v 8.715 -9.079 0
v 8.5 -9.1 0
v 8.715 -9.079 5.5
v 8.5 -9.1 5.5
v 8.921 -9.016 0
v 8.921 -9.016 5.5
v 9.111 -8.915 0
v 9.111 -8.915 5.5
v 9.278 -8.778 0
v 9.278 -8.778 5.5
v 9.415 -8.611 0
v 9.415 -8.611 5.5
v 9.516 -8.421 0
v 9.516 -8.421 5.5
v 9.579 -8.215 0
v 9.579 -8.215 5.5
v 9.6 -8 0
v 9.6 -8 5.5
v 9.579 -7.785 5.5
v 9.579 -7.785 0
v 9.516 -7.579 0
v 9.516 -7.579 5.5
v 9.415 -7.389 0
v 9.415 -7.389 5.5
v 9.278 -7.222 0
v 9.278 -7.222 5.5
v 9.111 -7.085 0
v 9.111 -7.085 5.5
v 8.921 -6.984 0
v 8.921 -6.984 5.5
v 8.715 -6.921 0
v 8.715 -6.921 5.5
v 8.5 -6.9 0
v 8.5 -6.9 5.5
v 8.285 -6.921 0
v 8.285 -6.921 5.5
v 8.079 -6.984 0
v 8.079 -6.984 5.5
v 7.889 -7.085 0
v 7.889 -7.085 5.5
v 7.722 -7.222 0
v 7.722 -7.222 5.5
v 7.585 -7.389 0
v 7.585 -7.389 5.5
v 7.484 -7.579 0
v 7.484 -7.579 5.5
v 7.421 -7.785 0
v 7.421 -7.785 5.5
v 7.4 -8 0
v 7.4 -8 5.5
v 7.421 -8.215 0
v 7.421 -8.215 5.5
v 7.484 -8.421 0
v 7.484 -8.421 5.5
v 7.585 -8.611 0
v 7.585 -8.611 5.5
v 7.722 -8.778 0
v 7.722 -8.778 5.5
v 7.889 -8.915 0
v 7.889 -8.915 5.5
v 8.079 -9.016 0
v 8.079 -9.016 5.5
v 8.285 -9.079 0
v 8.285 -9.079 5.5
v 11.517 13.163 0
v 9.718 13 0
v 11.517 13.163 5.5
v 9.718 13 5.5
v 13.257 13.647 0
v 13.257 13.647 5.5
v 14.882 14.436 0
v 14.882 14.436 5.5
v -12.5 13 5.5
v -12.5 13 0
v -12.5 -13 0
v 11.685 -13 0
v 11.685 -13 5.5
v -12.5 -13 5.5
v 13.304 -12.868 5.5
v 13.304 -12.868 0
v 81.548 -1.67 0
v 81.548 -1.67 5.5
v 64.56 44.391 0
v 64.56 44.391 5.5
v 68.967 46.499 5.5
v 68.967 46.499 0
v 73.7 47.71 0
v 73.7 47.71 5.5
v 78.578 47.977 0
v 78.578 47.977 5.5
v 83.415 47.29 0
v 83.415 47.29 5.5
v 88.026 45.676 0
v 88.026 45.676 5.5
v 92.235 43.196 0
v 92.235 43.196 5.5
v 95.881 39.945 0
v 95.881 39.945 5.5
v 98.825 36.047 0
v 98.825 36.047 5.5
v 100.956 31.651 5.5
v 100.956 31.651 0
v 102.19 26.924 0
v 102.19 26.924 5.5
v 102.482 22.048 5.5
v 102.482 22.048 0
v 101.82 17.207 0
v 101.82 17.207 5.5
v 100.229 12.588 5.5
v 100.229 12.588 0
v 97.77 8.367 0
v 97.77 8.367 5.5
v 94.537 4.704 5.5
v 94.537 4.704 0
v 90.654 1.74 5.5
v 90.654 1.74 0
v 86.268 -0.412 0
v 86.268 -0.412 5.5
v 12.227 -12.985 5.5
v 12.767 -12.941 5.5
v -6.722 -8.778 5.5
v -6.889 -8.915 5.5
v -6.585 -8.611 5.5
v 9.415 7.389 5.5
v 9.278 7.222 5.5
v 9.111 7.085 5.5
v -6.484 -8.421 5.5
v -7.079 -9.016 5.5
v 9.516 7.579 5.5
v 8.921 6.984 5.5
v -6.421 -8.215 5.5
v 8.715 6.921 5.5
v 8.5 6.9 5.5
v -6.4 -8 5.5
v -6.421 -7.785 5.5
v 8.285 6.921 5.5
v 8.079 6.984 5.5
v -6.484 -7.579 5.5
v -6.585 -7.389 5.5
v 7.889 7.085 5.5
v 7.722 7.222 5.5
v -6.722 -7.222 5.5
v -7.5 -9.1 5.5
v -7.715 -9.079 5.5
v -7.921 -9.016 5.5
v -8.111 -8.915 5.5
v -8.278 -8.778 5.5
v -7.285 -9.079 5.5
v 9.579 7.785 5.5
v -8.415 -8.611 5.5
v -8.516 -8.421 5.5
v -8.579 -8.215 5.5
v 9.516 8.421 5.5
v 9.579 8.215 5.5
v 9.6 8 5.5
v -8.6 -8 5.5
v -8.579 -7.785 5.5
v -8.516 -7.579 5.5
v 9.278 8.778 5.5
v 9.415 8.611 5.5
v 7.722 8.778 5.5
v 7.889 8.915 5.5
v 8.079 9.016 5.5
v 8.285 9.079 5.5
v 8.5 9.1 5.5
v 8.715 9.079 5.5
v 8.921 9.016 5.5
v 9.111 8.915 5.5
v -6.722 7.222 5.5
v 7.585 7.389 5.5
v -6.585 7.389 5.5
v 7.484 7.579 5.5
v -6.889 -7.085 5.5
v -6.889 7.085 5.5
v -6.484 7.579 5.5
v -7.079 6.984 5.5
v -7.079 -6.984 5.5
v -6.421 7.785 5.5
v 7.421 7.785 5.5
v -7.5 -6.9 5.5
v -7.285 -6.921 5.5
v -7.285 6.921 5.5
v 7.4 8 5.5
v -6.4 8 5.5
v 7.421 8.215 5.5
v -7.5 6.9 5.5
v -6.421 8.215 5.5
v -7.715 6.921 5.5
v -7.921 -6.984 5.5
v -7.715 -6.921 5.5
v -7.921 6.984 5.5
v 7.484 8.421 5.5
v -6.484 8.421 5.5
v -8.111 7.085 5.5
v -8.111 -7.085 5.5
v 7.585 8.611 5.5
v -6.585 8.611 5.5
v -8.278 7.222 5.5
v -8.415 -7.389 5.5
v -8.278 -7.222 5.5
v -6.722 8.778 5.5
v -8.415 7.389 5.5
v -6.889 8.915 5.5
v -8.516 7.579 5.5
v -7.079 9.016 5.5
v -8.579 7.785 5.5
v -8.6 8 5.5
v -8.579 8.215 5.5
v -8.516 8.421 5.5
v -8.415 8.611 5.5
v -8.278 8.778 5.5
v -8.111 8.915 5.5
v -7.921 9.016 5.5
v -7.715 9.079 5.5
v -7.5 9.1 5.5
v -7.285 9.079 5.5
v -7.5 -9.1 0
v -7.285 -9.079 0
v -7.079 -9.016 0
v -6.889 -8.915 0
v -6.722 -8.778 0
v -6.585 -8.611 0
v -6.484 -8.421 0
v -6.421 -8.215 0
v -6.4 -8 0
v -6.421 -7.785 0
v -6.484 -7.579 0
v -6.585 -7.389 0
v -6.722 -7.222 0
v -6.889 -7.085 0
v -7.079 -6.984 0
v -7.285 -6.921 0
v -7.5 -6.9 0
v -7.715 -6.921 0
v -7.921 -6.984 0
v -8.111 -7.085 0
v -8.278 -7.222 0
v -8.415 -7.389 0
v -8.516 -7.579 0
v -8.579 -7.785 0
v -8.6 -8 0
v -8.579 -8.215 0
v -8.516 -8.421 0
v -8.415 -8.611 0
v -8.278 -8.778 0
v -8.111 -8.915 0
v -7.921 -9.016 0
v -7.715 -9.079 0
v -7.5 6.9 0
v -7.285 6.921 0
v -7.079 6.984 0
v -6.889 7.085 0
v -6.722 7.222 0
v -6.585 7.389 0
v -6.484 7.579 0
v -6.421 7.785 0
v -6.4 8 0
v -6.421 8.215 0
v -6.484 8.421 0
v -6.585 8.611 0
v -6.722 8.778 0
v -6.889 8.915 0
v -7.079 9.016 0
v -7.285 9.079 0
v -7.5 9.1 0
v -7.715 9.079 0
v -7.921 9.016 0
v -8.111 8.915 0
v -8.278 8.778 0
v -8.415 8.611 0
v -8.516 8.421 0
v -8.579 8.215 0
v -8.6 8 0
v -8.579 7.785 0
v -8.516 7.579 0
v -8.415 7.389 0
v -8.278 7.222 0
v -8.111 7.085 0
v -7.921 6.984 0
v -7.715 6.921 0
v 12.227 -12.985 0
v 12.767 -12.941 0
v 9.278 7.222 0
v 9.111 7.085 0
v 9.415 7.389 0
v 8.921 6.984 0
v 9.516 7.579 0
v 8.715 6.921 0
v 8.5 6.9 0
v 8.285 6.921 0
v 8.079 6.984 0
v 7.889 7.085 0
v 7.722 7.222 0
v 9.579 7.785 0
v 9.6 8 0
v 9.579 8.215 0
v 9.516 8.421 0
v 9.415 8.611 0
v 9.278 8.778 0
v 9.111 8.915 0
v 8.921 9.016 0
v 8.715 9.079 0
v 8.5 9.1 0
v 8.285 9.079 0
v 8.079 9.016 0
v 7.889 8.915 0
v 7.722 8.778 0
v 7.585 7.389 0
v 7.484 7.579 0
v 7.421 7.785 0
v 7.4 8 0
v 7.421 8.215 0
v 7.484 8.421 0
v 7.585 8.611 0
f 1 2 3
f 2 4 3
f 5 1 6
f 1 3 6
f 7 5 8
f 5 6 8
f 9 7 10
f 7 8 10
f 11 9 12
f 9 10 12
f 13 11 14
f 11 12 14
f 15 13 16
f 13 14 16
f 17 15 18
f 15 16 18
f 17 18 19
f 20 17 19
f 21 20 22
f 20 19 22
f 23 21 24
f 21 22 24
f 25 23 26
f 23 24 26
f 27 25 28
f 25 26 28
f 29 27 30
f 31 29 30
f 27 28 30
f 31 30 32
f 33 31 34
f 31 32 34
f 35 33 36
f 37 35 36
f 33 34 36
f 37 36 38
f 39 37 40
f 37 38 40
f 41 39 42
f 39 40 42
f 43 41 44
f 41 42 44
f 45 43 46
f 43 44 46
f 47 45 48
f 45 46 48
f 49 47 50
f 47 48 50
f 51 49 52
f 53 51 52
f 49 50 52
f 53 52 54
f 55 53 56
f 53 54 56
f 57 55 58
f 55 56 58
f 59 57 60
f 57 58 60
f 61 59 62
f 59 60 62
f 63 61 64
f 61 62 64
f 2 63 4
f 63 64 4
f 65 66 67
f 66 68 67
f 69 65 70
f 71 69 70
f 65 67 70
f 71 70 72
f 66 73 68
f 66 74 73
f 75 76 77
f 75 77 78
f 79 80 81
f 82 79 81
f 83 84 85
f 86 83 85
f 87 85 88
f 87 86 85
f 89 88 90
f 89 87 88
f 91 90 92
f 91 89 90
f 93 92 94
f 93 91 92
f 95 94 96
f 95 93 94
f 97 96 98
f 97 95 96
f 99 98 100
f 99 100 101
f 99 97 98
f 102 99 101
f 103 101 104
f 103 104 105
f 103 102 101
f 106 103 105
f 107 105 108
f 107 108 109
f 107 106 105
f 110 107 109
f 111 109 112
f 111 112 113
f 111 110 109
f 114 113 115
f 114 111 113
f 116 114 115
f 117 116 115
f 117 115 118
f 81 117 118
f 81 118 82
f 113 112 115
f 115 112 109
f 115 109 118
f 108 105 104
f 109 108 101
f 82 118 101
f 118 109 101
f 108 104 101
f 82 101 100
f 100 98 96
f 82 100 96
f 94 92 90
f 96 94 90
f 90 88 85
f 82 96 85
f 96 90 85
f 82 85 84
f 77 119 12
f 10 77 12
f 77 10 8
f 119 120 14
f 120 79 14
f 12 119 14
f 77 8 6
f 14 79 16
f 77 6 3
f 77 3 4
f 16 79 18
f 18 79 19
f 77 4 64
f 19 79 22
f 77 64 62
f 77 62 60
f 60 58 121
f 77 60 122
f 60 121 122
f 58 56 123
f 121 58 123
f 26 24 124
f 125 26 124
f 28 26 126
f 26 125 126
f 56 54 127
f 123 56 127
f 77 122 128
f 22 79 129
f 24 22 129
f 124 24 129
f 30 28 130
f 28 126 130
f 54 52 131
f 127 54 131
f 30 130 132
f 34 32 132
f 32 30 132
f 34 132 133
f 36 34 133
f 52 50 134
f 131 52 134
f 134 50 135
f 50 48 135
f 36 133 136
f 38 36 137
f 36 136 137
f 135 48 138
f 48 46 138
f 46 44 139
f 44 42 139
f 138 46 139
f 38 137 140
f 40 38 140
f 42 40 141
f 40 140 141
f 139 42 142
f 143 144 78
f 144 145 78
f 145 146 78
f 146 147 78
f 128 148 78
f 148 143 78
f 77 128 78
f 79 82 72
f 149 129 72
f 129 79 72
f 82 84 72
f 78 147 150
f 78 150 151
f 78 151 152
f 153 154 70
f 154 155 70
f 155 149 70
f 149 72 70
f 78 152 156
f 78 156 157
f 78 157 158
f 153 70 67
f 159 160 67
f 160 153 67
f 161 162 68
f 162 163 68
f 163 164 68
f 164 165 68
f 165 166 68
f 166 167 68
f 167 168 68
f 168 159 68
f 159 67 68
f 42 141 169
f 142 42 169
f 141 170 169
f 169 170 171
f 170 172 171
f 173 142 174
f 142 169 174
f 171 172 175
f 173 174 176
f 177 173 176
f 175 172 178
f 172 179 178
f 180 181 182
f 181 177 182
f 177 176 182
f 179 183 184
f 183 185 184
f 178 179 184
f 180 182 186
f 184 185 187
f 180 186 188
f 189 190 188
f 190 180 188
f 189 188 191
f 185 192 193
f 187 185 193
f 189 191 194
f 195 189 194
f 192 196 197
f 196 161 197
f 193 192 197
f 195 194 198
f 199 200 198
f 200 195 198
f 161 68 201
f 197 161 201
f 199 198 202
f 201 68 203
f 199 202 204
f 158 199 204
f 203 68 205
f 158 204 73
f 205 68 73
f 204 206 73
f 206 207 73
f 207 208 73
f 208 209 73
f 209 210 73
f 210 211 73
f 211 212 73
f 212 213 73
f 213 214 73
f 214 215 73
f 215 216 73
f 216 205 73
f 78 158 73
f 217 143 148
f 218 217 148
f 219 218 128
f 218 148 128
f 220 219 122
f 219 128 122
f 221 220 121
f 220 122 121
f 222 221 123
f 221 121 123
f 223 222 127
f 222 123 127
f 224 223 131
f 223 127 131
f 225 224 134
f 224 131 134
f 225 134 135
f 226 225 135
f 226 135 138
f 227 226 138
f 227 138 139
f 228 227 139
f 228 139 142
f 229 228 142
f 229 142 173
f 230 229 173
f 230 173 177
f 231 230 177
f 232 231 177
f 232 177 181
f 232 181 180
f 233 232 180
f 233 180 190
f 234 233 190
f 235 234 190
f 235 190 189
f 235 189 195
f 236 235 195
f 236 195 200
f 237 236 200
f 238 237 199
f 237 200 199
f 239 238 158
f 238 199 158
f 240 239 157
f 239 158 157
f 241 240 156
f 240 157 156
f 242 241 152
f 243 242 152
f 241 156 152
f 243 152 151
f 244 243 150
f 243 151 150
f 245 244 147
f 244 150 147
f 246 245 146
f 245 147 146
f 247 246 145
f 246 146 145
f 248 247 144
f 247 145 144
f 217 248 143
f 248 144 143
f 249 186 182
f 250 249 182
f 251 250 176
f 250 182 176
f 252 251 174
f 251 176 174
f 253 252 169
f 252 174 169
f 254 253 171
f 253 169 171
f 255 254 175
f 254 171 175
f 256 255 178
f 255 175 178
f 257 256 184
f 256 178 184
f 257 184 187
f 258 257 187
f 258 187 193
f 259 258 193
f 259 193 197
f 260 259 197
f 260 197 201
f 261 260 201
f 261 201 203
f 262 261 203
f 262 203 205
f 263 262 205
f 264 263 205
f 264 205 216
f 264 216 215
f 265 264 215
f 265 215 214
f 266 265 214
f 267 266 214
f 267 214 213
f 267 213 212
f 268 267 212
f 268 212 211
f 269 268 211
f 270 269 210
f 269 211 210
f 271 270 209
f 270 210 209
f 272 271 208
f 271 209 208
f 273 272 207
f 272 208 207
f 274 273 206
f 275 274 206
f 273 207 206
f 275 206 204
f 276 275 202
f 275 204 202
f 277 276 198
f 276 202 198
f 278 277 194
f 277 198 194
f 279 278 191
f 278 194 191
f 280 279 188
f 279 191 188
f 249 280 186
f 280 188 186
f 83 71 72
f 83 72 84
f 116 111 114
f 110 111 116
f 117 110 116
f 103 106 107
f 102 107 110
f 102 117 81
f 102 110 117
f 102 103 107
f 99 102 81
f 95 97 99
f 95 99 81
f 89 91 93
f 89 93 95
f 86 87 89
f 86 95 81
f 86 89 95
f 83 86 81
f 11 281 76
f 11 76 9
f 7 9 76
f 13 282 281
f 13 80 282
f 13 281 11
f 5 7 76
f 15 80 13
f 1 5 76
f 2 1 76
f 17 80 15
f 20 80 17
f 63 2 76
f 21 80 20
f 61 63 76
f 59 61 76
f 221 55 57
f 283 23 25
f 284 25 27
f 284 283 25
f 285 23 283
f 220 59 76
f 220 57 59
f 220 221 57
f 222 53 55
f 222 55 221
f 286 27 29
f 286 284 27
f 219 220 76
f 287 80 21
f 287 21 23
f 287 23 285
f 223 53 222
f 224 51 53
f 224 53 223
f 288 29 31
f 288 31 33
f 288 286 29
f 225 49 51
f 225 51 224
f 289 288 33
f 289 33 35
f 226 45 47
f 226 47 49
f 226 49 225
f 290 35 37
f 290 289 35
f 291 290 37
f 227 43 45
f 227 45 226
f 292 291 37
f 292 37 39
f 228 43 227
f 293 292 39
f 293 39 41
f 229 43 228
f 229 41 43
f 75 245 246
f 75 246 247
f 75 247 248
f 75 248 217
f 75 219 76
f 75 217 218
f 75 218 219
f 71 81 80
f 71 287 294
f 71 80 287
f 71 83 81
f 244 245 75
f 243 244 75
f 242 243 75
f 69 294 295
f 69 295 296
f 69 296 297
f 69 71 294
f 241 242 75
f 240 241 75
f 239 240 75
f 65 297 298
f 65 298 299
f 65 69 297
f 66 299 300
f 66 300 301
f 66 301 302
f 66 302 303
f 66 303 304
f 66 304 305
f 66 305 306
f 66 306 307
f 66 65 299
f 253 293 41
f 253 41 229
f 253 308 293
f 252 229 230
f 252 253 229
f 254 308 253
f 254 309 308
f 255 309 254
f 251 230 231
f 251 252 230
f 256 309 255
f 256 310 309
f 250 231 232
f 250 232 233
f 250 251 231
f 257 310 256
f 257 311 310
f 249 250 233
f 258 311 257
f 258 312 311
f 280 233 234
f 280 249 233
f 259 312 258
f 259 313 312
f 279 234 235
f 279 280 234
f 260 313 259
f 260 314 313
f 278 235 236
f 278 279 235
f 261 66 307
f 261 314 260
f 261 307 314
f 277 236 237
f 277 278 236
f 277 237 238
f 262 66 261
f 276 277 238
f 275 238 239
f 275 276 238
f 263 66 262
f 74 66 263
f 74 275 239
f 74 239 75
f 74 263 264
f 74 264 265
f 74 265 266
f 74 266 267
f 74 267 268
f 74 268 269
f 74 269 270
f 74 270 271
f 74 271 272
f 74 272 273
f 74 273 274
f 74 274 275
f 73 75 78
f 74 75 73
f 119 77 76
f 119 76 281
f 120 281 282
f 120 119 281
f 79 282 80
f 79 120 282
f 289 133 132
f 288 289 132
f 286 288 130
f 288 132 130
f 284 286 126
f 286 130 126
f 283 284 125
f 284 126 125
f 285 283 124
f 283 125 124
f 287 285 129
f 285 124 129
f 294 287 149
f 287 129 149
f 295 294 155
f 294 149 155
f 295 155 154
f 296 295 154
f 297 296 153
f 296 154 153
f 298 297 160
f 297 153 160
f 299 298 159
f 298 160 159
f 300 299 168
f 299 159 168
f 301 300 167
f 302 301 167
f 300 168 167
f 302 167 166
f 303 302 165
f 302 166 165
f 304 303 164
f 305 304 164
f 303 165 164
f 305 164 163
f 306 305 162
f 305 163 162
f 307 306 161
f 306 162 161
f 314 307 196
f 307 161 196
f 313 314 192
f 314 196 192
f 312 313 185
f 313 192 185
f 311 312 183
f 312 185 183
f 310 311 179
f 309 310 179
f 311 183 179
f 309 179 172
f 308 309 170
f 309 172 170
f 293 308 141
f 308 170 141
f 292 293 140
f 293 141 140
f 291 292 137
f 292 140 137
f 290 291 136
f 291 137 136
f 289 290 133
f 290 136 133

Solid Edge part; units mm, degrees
sketch "Sketch1" plane through (0, 0, 0) normal (0, 0, 1) x (1, 0, 0)
  line L0 (12.5, -13) -> (-12.5, -13)
  line L1 (-12.5, -13) -> (-12.5, 13)
  line L2 (-12.5, 13) -> (12.5, 13)
  line L3 (12.5, 13) -> (12.5, -13)
  dimension "D1" = 26
  dimension "D2" = 25
extrude "Protrusion1" add sketch "Sketch1" along normal blind 5.5
hole "Hole_1" at (-7.5, -8, 5.5) direction (0, 0, -1) diameter 2.2 end up to next
hole "Hole1" at (-7.5, 8, 5.5) direction (0, 0, -1) diameter 2.2 end up to next
hole "Hole2" at (8.5, 8, 5.5) direction (0, 0, -1) diameter 2.2 end up to next
hole "Hole3" at (8.5, -8, 5.5) direction (0, 0, -1) diameter 2.2 end up to next
sketch "Sketch2" plane through (0, 0, 0) normal (0, 0, -1) x (0, -1, 0)
  circle A0 centre (-23, -77.5) radius 25
  dimension "D1" = 10
  dimension "D2" = 90
extrude "ExtrudedProtrusion_2" add sketch "Sketch2" against normal blind 5.5
sketch "Sketch3" plane through (0, 0, 0) normal (0, 0, -1) x (-1, 0, 0)
  line L0 (-12.5, -13) -> (-81.548, -1.6701)
  line L1 (-64.5909, 44.4092) -> (-81.548, -1.6701)
  line L2 (-12.5, 13) -> (-64.5909, 44.4092)
  line L3 (-12.5, -13) -> (-12.5, 13)
extrude "ExtrudedProtrusion_5" add sketch "Sketch3" against normal blind 5.5
fillet "Round_2" radius 10 2 edges at (12.5, 13, 2.75) (12.5, -13, 2.75)
properties material "木材, アッシュ"
